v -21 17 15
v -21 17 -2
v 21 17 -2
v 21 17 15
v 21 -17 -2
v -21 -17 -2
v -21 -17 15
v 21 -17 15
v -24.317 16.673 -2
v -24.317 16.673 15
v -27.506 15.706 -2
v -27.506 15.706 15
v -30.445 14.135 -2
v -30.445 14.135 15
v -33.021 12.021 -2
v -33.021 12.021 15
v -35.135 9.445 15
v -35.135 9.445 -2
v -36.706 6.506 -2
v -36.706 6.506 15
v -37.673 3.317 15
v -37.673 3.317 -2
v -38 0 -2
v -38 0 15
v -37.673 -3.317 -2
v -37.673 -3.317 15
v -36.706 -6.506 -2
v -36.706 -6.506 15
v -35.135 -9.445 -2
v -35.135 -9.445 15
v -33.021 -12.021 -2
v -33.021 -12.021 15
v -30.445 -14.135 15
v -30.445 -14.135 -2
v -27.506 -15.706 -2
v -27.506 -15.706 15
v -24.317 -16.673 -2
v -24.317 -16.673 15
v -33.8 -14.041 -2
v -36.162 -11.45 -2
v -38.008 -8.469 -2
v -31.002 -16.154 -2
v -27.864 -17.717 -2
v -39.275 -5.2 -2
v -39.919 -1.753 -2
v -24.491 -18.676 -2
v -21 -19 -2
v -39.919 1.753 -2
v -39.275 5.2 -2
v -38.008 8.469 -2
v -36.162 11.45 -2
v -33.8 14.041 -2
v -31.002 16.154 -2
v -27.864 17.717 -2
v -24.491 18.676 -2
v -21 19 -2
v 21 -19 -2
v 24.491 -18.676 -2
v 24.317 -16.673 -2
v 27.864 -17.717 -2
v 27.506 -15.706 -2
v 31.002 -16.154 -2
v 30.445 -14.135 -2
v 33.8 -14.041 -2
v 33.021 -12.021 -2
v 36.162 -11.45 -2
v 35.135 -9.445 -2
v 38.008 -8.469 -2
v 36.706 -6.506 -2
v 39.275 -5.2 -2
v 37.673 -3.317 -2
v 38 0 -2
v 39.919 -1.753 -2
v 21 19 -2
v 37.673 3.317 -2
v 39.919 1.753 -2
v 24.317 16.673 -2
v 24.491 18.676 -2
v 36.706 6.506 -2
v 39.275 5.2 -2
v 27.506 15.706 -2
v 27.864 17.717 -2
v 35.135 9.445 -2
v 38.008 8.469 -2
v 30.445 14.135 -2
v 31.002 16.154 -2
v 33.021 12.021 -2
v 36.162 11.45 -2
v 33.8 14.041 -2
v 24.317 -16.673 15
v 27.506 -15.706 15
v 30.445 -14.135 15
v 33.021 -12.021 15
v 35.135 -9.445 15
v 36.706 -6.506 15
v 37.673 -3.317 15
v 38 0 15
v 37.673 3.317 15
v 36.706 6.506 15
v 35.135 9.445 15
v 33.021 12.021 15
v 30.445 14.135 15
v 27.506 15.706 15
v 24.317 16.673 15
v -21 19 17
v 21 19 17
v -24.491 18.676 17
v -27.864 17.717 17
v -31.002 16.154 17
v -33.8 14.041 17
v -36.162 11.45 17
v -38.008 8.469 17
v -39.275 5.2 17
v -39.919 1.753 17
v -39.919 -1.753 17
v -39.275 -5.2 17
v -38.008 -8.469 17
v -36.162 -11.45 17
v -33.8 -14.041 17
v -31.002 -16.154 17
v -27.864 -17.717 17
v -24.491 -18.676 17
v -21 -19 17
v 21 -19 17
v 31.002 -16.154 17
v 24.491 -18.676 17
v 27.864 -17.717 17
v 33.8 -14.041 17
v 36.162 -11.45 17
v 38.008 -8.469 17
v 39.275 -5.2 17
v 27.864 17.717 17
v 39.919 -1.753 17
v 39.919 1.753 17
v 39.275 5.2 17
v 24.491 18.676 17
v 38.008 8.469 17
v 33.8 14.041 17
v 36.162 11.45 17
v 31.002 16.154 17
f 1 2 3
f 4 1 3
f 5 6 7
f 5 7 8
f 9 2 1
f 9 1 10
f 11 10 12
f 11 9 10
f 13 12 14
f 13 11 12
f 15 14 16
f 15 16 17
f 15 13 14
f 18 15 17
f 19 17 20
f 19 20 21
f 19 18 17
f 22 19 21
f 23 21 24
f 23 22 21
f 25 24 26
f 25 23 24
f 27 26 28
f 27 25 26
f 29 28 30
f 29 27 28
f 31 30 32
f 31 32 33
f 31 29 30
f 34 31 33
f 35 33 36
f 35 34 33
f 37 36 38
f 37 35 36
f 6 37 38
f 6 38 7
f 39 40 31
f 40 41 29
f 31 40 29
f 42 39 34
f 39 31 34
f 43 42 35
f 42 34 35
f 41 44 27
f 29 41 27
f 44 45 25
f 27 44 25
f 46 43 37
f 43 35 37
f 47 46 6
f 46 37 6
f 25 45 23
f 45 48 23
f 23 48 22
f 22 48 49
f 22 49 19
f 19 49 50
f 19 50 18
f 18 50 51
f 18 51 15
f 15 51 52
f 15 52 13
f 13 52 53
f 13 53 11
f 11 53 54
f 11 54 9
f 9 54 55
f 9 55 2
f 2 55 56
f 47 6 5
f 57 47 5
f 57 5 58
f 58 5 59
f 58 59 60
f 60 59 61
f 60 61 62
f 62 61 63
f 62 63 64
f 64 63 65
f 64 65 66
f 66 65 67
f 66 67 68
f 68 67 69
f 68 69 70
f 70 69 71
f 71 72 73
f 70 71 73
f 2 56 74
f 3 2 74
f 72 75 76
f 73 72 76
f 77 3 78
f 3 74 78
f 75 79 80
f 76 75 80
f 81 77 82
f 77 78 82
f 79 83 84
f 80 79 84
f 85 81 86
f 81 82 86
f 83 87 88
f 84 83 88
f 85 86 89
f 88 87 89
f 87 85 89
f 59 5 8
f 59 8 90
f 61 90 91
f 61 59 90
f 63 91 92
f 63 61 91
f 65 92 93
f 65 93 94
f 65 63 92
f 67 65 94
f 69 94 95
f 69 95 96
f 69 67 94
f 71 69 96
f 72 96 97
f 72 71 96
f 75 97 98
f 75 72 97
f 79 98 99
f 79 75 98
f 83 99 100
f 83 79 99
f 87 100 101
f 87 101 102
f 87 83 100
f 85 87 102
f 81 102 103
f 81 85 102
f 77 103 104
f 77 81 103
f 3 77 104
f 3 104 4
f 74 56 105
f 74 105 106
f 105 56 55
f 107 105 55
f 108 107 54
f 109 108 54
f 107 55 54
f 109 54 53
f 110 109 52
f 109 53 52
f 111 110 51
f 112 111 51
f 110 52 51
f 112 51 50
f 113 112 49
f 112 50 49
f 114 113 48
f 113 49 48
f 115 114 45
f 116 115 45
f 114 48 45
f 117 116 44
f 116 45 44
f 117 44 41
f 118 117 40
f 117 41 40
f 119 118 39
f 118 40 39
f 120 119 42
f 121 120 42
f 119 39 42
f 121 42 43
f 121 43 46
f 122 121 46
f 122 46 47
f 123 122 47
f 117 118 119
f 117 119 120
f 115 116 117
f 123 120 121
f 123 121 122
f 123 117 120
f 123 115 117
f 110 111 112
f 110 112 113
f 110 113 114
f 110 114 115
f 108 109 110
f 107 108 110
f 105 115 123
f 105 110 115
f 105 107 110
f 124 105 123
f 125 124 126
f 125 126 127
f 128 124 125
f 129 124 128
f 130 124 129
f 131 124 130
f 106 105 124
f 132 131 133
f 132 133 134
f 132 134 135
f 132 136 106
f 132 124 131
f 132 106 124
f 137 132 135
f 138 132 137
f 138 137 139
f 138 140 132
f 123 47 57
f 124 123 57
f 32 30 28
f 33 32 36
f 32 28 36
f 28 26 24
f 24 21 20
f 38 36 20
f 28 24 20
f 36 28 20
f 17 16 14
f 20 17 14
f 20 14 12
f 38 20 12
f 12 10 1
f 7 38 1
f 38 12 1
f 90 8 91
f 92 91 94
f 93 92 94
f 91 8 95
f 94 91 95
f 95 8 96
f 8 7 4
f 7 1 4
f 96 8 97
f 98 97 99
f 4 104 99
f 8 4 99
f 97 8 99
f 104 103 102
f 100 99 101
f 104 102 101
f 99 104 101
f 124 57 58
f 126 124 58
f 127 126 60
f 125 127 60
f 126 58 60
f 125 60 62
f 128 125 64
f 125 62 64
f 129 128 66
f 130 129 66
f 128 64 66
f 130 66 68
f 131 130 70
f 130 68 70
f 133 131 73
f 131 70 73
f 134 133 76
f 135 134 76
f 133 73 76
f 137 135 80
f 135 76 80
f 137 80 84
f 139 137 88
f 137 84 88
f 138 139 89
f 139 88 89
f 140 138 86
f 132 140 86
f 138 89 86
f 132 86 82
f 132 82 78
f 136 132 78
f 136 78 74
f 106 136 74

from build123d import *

# Parameters (mm, degrees)
PAD004_DEPTH = 2
PAD_DEPTH    = 15
PAD001_DEPTH = 4


with BuildPart() as topinside:
    # Sketch004 → Pad004 (new body)
    with BuildSketch(Plane.XY.offset(13)):
        with BuildLine():
            ThreePointArc((-21, 17), (-38, 0), (-21, -17))
            Line((-21, -17), (21, -17))
            ThreePointArc((21, -17), (38, 0), (21, 17))
            Line((-21, 17), (21, 17))
        make_face()
    extrude(amount=PAD004_DEPTH)


with BuildPart() as sides:
    # Sketch → Pad (new body)
    with BuildSketch(Plane.XY):
        with BuildLine():
            ThreePointArc((-21, 19), (-40, 0), (-21, -19))
            Line((-21, -19), (21, -19))
            ThreePointArc((21, -19), (40, 0), (21, 19))
            Line((-21, 19), (21, 19))
        make_face()
        with BuildLine():
            ThreePointArc((-21, 17), (-38, 0), (-21, -17))
            Line((-21, -17), (21, -17))
            ThreePointArc((21, -17), (38, 0), (21, 17))
            Line((-21, 17), (21, 17))
        make_face(mode=Mode.SUBTRACT)
    extrude(amount=PAD_DEPTH)


with BuildPart() as sides_1:
    # Body placement: moved
    add(sides.part.moved(Location((0, 0, -2))))


with BuildPart() as top:
    # Sketch001 → Pad001 (new body)
    with BuildSketch(Plane.XY.offset(13)):
        with BuildLine():
            ThreePointArc((-21, 19), (-40, 0), (-21, -19))
            Line((-21, -19), (21, -19))
            ThreePointArc((21, -19), (40, 0), (21, 19))
            Line((-21, 19), (21, 19))
        make_face()
    extrude(amount=PAD001_DEPTH)

    # Boolean: cut TopInside
    add(topinside.part, mode=Mode.SUBTRACT)

    # Boolean002: union Sides
    add(sides_1.part)


solid = top.part
